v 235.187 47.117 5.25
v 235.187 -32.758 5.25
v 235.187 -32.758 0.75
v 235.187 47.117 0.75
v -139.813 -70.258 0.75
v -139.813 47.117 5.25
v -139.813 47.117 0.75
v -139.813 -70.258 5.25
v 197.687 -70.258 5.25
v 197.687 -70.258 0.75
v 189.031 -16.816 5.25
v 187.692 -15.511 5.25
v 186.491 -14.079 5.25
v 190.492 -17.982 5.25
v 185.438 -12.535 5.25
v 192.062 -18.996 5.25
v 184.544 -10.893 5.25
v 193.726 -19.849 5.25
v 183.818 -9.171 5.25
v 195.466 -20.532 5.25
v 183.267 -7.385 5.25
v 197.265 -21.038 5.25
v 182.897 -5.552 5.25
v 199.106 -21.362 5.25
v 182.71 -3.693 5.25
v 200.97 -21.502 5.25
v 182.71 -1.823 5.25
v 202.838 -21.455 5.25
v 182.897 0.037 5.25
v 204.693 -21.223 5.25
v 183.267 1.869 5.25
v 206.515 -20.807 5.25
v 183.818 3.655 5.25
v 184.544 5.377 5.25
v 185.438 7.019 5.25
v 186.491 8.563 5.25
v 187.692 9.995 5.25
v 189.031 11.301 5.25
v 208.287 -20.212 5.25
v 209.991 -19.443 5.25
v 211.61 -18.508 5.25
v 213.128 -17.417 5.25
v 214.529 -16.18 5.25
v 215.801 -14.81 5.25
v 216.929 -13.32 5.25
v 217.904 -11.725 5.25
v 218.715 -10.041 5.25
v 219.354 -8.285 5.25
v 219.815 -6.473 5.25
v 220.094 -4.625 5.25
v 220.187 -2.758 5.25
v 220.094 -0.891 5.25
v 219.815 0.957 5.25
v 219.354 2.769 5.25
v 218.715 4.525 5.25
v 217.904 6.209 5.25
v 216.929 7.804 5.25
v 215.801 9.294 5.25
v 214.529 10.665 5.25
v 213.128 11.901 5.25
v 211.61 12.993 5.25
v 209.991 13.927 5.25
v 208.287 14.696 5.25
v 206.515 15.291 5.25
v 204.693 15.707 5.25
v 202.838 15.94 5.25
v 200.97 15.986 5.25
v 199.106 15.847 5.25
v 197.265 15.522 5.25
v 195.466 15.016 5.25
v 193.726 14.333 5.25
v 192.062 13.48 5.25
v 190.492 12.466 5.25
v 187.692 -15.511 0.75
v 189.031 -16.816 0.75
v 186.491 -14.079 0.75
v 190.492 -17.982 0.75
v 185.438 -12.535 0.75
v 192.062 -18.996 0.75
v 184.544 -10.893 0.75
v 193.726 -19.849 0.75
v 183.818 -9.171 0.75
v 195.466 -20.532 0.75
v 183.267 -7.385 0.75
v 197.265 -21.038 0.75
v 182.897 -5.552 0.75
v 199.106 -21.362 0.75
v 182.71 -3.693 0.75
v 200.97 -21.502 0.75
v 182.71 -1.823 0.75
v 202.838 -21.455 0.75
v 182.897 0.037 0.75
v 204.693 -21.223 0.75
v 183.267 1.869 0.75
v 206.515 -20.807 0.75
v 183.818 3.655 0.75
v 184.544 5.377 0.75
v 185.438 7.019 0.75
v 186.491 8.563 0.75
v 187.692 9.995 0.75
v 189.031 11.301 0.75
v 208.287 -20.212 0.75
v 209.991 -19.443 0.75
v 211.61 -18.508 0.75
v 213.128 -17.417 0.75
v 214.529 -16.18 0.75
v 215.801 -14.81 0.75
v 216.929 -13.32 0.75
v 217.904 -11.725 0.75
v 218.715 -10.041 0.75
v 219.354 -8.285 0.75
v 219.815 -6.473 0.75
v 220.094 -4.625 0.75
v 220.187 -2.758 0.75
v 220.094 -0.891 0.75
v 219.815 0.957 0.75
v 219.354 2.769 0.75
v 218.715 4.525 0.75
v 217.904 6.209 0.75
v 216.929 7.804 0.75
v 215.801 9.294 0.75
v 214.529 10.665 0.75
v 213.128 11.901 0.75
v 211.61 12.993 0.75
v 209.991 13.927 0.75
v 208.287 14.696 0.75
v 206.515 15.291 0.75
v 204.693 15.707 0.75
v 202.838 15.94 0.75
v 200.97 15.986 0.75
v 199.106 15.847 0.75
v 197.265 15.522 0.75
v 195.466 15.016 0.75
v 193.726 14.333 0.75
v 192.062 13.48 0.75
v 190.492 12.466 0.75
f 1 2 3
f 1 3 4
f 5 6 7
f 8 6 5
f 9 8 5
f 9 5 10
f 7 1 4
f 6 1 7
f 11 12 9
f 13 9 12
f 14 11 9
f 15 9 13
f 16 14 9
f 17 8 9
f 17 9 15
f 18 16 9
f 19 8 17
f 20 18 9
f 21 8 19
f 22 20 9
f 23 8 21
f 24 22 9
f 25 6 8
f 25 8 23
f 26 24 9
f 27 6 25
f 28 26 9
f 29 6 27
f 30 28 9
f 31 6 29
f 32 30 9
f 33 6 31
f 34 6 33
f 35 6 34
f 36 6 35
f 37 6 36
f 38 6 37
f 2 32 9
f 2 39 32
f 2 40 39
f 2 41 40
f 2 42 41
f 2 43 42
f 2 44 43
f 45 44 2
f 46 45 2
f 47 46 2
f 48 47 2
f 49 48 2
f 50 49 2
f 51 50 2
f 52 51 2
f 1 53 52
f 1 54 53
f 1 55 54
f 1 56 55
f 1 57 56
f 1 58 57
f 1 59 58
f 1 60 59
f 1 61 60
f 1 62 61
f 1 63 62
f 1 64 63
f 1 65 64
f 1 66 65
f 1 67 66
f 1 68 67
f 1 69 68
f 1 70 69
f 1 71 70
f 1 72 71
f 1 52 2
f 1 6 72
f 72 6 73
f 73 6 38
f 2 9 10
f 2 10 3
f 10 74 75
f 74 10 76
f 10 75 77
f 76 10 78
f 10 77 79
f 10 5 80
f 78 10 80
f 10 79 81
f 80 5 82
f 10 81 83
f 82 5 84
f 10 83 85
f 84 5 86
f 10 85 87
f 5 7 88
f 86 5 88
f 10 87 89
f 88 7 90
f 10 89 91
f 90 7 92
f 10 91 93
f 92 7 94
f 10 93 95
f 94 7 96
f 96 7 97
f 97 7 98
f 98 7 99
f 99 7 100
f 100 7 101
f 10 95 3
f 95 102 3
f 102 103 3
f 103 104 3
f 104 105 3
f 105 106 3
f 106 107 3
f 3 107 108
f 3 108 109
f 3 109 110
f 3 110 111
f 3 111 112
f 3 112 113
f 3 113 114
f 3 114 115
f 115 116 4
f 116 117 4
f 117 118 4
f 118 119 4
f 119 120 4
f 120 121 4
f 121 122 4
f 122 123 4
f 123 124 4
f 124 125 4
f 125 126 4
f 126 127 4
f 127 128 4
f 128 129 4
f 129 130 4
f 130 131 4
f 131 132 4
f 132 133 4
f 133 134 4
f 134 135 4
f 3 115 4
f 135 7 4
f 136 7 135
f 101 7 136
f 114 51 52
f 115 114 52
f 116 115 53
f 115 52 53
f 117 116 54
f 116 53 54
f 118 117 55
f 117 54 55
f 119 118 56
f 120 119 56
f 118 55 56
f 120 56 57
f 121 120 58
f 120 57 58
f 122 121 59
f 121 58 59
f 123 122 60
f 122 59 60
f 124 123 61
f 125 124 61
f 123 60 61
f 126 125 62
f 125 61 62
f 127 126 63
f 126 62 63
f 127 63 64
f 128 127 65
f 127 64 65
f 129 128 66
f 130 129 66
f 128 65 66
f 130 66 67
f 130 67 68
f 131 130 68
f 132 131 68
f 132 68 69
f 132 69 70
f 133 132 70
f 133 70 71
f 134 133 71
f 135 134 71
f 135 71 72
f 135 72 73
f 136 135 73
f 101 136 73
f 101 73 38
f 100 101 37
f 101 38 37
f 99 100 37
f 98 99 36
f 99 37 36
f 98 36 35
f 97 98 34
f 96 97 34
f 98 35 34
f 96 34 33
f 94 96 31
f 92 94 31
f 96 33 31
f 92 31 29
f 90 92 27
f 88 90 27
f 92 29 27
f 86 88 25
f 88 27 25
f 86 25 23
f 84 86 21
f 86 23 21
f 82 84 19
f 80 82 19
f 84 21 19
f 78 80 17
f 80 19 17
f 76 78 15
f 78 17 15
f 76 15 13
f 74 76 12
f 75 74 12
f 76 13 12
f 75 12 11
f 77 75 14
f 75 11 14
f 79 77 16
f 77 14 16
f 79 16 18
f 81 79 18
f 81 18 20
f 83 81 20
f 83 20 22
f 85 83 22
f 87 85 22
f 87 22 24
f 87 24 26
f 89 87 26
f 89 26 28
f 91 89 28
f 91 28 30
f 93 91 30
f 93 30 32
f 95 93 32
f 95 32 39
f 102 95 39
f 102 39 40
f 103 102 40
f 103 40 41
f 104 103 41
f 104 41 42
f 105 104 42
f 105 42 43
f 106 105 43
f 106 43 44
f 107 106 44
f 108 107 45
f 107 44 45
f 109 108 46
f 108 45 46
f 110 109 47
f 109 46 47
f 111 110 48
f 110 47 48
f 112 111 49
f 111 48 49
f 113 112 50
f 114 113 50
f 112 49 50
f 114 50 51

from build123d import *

# Parameters (mm, degrees)
SKETCH1_R           = 25
BOSS_EXTRUDE1_DEPTH = 6
SCALE1_SCALE        = 0.75


with BuildPart() as part:
    # Sketch1 → Boss-Extrude1 (new body)
    with BuildSketch(Plane.XY.offset(6)):
        Polygon((-200, -90), (250, -90), (300, -40), (300, 66.5), (-200, 66.5), align=None)
        with Locations((255, 0)):
            Circle(SKETCH1_R, mode=Mode.SUBTRACT)
    extrude(amount=-BOSS_EXTRUDE1_DEPTH)


with BuildPart() as part_1:
    # Scale1: scaled about (40.748726514, -11.031575069, 3)
    add(part.part.scale(SCALE1_SCALE).moved(Location((10.187181628, -2.757893767, 0.75))))


solid = part_1.part
